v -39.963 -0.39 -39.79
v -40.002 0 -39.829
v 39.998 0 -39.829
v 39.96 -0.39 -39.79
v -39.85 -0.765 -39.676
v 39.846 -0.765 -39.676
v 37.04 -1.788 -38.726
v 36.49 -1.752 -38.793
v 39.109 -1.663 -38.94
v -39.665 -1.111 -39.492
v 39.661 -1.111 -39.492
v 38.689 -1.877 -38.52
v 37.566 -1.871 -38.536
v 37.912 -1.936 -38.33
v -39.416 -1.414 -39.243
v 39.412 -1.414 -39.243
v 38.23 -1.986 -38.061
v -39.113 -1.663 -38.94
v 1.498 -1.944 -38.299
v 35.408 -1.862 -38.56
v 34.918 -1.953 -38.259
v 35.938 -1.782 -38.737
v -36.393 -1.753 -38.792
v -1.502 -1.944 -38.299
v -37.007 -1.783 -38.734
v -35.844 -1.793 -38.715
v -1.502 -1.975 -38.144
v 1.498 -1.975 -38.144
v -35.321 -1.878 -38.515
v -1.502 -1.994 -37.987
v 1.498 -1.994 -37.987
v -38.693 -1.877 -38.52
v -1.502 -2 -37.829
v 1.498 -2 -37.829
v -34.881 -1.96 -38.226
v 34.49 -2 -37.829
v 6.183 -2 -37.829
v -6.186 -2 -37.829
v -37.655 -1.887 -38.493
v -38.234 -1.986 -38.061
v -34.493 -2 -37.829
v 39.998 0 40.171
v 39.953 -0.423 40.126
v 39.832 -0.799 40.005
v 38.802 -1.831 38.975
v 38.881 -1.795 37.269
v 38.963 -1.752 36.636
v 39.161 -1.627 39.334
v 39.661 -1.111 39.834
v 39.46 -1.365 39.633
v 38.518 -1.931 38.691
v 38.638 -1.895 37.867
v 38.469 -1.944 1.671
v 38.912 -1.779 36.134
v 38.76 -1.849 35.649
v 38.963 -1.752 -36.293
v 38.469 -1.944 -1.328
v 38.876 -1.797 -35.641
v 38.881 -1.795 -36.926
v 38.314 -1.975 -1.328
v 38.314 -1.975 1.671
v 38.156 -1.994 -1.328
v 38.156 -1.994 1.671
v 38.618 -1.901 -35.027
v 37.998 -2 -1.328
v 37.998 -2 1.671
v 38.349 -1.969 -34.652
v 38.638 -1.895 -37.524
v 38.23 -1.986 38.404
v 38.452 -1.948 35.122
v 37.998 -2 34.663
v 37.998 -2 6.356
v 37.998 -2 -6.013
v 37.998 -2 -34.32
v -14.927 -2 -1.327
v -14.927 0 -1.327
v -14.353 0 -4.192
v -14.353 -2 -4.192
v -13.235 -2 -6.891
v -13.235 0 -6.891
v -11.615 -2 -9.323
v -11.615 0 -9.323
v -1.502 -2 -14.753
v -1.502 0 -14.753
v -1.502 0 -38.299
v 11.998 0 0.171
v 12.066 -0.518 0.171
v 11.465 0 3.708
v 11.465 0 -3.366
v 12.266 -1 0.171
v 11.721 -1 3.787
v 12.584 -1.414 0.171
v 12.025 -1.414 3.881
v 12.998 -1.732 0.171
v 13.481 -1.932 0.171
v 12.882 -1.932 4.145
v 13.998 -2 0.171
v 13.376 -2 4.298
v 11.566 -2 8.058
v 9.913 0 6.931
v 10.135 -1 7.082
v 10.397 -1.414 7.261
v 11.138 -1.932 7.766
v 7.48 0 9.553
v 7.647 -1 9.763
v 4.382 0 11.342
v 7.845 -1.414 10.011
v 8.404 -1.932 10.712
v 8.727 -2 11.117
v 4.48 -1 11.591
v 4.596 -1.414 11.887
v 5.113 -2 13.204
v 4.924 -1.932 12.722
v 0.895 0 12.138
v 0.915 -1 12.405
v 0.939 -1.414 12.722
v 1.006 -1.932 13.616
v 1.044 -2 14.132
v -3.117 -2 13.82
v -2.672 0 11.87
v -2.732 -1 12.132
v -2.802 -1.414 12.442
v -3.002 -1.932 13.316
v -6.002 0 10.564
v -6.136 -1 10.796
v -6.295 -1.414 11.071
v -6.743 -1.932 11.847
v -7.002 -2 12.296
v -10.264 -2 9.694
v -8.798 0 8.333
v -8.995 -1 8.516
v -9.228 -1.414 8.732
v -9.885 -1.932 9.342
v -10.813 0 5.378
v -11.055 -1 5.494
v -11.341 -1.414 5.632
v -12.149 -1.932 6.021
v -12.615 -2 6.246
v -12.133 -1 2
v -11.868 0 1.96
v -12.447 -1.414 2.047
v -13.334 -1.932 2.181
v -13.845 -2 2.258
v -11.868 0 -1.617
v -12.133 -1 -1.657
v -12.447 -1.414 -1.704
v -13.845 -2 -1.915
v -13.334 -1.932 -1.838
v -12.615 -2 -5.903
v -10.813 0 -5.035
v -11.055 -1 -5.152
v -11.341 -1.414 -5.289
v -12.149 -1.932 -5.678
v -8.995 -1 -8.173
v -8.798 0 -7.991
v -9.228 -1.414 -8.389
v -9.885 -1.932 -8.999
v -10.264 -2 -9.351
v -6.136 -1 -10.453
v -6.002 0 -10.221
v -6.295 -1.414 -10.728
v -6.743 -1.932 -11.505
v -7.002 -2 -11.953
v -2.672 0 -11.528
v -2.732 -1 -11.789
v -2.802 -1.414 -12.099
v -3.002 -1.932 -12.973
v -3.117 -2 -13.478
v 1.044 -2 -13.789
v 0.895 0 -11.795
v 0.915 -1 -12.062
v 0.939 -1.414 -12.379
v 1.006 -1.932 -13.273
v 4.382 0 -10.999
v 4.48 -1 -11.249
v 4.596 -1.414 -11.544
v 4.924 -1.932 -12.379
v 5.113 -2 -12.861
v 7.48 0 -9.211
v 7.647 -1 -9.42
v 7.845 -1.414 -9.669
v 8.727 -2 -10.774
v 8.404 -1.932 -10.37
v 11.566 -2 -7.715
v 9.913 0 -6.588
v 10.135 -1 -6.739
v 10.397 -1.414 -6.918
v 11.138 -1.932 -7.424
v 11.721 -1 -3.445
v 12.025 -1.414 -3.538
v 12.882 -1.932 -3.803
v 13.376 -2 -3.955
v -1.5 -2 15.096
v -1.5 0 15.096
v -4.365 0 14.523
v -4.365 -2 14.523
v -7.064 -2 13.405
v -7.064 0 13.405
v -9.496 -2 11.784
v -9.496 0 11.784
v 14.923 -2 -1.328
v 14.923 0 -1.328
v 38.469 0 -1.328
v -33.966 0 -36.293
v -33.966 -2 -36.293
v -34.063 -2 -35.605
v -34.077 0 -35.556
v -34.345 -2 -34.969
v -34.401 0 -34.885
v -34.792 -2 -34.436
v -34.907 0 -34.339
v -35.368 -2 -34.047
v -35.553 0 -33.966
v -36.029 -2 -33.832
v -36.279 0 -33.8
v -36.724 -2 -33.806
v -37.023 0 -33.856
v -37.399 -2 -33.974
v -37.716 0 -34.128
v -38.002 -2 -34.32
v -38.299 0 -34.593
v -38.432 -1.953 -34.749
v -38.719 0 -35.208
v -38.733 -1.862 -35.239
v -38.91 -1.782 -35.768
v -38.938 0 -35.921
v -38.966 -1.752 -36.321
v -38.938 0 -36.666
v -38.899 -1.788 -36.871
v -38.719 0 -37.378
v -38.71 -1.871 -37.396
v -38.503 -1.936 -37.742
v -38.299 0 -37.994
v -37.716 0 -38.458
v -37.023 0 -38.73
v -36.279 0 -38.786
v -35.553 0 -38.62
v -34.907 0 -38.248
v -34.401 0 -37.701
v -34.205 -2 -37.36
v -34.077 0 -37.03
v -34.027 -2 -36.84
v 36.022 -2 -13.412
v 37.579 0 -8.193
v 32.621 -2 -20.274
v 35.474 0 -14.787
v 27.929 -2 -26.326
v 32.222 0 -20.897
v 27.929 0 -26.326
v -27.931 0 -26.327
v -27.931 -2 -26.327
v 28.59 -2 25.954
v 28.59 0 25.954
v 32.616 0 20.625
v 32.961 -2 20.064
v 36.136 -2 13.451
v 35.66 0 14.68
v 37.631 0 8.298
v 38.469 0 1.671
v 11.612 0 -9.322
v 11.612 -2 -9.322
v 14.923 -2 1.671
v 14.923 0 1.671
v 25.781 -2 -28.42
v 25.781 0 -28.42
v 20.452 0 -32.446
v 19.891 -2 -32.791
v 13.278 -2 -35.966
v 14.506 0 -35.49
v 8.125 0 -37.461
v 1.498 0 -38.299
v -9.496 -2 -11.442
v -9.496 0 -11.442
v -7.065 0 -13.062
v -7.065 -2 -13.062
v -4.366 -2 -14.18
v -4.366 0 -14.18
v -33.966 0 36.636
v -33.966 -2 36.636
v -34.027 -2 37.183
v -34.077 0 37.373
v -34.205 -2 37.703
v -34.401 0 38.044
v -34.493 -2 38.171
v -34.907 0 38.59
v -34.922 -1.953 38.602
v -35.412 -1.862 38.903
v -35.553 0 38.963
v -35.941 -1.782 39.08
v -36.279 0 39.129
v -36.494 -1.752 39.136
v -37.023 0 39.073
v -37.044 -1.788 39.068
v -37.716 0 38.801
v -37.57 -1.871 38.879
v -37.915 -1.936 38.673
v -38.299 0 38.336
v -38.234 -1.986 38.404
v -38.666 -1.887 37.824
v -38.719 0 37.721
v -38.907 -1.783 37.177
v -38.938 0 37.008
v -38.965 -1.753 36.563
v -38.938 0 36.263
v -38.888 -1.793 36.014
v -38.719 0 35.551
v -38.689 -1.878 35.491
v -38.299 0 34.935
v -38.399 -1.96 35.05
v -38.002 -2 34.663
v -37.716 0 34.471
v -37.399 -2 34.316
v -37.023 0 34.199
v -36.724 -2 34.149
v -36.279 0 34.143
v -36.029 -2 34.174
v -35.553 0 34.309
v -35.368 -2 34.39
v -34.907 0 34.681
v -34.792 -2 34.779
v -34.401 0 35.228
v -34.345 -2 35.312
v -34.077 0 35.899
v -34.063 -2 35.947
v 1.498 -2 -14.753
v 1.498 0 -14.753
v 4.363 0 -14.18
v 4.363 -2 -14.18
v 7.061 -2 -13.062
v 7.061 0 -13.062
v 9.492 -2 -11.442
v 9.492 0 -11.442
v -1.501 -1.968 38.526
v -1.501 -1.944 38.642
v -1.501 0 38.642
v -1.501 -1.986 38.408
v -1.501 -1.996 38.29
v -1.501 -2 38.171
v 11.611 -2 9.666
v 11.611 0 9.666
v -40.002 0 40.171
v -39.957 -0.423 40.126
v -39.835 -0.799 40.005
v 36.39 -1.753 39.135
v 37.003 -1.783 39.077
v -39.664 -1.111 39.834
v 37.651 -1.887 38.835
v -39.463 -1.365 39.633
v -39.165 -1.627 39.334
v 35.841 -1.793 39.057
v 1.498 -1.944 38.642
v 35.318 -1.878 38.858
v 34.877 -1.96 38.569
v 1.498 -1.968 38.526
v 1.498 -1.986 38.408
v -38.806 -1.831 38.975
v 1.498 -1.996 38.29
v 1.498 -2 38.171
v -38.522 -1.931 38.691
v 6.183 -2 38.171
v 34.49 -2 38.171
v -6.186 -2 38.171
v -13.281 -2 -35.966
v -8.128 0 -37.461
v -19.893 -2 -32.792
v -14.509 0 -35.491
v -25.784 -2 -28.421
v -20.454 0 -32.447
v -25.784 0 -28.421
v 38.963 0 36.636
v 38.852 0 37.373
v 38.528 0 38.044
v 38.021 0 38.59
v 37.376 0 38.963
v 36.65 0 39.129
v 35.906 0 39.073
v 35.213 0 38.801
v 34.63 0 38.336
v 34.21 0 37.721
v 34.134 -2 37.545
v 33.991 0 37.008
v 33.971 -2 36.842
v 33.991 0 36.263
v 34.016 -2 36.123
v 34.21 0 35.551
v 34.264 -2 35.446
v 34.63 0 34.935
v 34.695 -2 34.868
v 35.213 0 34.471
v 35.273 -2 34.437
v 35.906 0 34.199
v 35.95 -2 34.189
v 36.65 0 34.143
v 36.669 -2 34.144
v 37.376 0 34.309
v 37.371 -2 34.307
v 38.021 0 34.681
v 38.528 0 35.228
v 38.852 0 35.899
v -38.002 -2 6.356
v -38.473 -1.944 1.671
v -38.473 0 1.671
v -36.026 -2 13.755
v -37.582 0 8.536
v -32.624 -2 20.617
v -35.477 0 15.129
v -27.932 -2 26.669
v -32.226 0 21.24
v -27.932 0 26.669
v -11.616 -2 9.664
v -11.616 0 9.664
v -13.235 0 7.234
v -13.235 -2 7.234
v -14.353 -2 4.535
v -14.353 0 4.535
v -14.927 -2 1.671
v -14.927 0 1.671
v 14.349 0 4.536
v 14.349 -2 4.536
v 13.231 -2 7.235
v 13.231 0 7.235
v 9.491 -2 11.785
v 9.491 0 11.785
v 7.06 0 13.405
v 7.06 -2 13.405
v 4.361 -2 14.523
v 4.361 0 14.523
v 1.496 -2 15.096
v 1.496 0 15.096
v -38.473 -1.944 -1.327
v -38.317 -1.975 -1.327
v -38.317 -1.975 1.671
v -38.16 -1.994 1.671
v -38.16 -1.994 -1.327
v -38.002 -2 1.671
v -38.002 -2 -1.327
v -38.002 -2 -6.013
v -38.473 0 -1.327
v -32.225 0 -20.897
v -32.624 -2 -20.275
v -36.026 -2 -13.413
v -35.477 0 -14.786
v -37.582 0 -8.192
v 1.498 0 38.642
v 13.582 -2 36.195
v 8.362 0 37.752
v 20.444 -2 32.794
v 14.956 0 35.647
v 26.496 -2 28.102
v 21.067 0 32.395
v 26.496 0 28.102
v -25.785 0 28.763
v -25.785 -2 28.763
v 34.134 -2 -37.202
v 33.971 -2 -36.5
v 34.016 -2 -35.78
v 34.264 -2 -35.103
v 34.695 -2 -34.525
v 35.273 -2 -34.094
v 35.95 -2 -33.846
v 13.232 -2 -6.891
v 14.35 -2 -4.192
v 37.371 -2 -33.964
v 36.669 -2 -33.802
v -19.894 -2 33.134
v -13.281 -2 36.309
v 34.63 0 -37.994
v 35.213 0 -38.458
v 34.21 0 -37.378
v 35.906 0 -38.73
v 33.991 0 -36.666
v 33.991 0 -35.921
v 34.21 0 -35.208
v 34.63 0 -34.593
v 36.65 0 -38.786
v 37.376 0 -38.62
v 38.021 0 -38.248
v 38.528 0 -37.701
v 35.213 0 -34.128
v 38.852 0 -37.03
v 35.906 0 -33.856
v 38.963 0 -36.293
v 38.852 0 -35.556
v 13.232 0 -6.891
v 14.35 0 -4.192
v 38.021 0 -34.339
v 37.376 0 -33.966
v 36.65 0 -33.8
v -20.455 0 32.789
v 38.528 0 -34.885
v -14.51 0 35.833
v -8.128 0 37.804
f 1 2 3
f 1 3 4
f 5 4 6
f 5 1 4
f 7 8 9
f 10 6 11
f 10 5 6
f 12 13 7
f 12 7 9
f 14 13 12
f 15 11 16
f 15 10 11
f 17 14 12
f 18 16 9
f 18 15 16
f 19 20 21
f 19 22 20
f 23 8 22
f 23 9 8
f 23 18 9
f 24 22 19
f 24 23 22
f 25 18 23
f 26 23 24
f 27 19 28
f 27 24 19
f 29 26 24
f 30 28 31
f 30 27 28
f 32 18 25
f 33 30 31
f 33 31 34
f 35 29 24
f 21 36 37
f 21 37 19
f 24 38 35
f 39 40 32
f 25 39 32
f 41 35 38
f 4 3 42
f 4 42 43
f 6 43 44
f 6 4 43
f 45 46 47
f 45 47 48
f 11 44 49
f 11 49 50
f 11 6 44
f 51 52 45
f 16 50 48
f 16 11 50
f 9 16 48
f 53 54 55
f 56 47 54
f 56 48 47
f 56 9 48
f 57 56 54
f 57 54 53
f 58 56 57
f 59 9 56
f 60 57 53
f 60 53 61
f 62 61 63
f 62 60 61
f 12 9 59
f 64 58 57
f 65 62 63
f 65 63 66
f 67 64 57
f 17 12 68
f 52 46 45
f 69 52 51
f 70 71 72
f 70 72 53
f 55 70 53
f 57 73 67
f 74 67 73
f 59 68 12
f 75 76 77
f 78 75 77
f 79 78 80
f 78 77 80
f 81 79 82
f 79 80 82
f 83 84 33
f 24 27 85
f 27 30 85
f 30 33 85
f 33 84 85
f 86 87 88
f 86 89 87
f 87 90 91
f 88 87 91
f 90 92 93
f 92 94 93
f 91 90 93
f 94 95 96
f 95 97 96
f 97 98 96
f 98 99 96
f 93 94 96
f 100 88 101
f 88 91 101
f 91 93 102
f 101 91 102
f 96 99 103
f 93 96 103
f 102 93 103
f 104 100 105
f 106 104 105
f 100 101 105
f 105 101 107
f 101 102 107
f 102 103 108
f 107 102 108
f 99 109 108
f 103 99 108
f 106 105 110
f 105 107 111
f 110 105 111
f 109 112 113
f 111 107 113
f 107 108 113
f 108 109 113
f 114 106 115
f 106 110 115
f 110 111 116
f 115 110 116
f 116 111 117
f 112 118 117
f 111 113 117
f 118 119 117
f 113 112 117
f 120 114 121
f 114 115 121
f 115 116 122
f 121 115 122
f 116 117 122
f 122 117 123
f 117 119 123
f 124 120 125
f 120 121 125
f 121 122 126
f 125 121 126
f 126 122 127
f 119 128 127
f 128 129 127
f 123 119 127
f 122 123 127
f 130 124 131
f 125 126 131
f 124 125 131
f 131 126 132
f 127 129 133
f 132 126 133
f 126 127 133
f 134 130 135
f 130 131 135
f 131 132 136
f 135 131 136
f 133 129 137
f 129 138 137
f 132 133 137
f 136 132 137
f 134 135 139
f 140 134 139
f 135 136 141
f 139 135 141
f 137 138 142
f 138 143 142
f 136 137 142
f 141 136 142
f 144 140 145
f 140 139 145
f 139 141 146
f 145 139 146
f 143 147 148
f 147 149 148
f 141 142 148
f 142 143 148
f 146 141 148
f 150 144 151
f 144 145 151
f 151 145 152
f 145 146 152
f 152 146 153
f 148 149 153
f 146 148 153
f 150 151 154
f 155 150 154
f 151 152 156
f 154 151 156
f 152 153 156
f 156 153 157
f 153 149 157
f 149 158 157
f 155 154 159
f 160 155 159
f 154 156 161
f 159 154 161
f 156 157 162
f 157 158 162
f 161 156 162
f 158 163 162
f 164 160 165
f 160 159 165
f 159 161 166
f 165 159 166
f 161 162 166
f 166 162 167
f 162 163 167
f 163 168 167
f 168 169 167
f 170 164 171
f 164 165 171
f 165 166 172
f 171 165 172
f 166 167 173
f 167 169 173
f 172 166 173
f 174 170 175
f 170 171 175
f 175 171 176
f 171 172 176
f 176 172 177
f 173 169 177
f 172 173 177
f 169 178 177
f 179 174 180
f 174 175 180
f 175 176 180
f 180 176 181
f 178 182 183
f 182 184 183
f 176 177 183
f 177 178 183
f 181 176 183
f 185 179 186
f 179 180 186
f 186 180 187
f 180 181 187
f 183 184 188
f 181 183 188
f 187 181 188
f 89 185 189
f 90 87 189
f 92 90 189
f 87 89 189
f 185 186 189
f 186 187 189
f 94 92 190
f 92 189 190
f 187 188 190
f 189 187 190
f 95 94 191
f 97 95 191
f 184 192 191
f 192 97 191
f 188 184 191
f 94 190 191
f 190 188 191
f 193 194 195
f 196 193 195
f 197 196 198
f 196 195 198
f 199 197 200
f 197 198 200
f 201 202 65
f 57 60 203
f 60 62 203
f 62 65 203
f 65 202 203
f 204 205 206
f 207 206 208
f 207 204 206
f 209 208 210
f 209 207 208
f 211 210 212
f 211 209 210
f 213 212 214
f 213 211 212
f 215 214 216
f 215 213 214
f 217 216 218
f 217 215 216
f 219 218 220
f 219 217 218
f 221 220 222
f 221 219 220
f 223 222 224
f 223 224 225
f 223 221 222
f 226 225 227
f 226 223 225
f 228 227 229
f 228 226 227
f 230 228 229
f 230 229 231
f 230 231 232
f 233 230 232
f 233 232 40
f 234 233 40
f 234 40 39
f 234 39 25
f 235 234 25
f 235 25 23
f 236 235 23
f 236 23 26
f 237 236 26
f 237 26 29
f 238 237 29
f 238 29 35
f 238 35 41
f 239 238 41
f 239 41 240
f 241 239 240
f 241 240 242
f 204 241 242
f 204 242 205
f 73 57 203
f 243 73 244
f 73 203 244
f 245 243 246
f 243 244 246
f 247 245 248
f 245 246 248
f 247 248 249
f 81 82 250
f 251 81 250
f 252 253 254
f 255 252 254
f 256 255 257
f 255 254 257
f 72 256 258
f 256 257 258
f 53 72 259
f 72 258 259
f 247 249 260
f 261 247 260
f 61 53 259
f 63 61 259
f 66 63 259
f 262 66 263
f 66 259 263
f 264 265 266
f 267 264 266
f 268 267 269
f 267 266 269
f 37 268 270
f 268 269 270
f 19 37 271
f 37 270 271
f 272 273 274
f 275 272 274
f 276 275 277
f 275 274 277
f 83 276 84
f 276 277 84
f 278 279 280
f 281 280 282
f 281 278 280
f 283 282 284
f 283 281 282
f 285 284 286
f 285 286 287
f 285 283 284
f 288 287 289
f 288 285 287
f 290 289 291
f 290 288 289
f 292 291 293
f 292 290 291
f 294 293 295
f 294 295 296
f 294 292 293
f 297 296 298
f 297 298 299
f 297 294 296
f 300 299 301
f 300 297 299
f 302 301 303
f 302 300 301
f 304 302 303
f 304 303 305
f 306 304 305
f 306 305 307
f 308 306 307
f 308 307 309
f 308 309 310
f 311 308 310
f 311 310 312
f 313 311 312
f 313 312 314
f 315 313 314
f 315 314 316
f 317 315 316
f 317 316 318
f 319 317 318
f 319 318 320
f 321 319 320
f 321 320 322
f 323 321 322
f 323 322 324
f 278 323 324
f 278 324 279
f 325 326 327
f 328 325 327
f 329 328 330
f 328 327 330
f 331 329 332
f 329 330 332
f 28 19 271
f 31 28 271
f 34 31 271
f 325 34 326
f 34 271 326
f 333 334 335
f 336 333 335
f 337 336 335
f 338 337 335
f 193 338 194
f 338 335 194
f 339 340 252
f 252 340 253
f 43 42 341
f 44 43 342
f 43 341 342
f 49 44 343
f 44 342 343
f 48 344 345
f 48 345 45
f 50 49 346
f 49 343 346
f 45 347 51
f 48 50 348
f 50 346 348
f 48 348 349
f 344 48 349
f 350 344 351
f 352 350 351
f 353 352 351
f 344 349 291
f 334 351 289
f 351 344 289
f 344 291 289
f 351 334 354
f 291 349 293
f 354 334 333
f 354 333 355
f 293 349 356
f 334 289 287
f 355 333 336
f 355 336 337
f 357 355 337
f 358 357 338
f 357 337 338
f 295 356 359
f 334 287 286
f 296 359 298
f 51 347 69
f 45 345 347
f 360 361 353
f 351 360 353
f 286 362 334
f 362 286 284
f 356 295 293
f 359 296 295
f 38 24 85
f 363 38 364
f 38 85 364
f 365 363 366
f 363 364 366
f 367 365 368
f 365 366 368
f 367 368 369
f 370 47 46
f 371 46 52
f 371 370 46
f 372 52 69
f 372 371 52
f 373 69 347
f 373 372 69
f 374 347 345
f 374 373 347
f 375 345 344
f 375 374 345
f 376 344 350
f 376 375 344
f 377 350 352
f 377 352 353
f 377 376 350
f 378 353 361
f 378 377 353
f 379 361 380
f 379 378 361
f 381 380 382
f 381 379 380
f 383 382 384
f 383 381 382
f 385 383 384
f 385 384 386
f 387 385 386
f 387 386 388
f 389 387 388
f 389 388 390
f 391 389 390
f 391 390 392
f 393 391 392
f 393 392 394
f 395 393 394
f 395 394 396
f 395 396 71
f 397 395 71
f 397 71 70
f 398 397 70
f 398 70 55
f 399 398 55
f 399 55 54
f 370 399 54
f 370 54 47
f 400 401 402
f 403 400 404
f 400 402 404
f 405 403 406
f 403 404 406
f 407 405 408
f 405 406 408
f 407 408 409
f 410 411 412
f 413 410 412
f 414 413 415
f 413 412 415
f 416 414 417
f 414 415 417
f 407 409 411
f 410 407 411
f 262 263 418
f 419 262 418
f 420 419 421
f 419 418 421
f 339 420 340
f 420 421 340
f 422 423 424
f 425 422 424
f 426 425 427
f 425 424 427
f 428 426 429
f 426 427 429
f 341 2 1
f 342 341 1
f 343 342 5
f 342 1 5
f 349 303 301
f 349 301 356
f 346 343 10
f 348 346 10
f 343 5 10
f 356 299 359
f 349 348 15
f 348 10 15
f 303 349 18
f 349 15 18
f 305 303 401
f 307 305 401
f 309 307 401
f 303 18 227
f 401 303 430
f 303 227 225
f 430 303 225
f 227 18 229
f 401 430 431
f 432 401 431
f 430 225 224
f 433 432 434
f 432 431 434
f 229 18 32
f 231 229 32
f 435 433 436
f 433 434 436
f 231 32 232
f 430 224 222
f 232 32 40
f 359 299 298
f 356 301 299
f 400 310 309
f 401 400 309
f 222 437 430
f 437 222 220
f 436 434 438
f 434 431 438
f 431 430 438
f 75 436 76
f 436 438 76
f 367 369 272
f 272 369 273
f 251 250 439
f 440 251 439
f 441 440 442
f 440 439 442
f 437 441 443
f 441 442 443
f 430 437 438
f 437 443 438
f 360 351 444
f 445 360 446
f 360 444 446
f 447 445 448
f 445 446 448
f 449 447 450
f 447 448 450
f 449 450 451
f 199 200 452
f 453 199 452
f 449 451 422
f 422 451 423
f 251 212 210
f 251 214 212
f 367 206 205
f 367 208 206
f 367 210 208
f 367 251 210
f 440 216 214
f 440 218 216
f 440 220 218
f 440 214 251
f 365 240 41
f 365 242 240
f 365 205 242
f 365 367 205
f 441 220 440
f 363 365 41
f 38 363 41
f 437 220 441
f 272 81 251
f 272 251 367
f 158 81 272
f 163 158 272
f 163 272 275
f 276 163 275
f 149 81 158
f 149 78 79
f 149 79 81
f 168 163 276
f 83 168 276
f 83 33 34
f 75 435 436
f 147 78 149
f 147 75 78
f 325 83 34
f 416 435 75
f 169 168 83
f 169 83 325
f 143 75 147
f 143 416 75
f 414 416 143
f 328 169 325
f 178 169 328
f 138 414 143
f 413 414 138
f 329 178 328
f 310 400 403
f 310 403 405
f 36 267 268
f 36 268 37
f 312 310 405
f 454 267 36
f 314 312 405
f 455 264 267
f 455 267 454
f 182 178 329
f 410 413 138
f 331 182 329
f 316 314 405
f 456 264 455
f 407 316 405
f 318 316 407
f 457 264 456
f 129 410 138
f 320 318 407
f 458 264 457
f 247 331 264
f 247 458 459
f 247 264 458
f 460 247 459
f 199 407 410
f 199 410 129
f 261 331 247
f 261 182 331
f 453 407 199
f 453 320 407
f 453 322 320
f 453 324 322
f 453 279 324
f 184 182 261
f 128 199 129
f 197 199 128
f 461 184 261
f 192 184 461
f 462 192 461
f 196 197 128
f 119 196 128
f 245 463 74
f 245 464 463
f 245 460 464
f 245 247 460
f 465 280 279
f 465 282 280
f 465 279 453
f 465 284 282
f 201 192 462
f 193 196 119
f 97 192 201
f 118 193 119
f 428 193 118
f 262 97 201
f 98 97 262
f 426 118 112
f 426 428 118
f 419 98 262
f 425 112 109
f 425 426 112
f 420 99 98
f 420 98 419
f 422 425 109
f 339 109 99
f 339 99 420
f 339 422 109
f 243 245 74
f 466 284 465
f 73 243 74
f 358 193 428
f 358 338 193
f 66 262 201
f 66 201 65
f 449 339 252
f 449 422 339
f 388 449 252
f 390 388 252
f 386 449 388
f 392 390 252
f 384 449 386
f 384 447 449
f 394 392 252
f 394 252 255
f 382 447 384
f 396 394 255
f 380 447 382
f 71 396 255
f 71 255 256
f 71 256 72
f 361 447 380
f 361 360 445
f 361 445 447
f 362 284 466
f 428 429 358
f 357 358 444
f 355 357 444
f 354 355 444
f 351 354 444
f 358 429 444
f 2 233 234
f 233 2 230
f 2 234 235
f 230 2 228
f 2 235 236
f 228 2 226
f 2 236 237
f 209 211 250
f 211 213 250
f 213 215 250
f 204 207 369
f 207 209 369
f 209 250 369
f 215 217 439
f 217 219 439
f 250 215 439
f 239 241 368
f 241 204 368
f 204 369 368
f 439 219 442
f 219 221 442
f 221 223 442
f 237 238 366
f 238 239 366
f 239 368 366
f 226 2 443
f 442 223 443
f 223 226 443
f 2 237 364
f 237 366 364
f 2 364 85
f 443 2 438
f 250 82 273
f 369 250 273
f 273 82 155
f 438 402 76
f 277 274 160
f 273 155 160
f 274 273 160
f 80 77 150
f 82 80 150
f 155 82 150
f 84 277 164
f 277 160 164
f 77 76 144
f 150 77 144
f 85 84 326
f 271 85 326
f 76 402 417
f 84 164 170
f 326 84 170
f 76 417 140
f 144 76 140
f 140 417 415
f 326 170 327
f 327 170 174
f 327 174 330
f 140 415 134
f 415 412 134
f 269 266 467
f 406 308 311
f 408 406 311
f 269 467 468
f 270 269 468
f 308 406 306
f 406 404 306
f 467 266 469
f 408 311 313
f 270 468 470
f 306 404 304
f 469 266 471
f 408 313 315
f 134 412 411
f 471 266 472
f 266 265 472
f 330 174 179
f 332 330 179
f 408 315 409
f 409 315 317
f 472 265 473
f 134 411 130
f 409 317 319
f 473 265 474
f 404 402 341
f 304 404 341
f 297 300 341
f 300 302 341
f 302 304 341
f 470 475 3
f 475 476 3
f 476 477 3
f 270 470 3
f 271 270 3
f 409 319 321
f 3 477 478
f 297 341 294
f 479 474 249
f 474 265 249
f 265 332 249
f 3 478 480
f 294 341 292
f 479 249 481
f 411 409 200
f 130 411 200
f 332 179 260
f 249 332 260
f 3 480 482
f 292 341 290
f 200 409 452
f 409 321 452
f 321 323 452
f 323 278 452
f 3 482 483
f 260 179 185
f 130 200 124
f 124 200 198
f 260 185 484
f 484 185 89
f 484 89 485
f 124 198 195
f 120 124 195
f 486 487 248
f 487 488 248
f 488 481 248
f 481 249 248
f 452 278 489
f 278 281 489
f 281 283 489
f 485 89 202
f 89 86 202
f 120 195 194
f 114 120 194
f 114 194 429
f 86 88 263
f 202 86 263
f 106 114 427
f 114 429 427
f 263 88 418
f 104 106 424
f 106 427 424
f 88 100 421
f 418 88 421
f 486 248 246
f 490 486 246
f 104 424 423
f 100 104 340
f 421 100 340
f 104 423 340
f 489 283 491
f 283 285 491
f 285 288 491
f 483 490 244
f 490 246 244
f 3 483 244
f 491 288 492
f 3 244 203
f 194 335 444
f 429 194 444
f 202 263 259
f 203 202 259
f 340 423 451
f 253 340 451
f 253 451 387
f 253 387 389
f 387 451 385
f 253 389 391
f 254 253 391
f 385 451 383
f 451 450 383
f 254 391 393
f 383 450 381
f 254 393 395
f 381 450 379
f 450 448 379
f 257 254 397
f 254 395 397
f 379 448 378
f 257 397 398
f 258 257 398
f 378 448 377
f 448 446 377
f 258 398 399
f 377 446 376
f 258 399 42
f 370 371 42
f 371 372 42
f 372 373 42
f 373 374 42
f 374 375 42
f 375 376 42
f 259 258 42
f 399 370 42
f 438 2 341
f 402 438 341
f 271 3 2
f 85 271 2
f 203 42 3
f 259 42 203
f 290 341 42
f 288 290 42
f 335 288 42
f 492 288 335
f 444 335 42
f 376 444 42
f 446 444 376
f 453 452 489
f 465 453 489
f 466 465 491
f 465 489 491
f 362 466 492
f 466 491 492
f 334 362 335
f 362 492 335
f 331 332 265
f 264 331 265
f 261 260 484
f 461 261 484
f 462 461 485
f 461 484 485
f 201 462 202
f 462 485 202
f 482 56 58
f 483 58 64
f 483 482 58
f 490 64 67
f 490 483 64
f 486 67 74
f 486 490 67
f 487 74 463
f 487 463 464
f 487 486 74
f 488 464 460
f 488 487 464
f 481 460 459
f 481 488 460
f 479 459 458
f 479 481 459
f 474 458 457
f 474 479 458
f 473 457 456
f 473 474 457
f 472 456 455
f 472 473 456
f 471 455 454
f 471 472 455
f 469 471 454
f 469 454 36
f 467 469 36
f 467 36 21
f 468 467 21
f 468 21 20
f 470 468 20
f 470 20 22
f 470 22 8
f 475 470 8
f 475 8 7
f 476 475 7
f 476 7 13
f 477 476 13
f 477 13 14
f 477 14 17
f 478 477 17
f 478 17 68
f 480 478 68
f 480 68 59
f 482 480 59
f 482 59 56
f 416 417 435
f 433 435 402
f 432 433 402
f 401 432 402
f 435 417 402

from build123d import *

# Parameters (mm, degrees)
F0_W        = 80
F0_H        = 80
F0_R        = 2.5
F0_R_2      = 12
F1_DEPTH    = 2
F2_T1_DEPTH = 90
F2_T3_DEPTH = 90


# Not quite as in the source:
# - a fillet or chamfer that OpenCascade refuses, or shapes differently, is made with other operations: its cross-section is extruded or revolved along the edge and cut away or added


with BuildPart() as f1:
    # F0 (on Front) → F1 (new body)
    with BuildSketch(Plane.XZ):
        with Locations((-0.0017476827, 0.1713572443)):
            Rectangle(F0_W, F0_H)
        with Locations((-36.4662137768, -36.2931088498)):
            Circle(F0_R, mode=Mode.SUBTRACT)
        with Locations((36.4627184114, -36.2931088498)):
            Circle(F0_R, mode=Mode.SUBTRACT)
        with Locations((-36.4662137768, 36.6358233383)):
            Circle(F0_R, mode=Mode.SUBTRACT)
        with BuildLine():
            ThreePointArc((38.4690204407, 1.6713572443), (38.4909436544, 0.9214996478), (38.4982523173, 0.1713572443))
            ThreePointArc((38.4982523173, 0.1713572443), (38.4909464293, -0.5786427557), (38.4690315381, -1.3283581108))
            ThreePointArc((38.4690315381, -1.3283581108), (35.4737380316, -14.7865808935), (27.9287857338, -26.3264785744))
            ThreePointArc((27.9287857338, -26.3264785744), (26.8753996766, -27.3943633128), (25.7812151161, -28.4204043195))
            ThreePointArc((25.7812151161, -28.4204043195), (14.5064210867, -35.4904295724), (1.498122464, -38.2994159419))
            ThreePointArc((1.498122464, -38.2994159419), (0.7484071972, -38.3213338497), (-0.0015927734, -38.3286427554))
            ThreePointArc((-0.0015927734, -38.3286427554), (-0.7517476827, -38.3213368677), (-1.5016178294, -38.2994159419))
            ThreePointArc((-1.5016178294, -38.2994159419), (-14.5093699729, -35.4906518899), (-25.7838341949, -28.421194497))
            ThreePointArc((-25.7838341949, -28.421194497), (-26.8780502008, -27.3951870251), (-27.9314689858, -26.3273345712))
            ThreePointArc((-27.9314689858, -26.3273345712), (-35.4773135858, -14.7863907098), (-38.4725889134, -1.3267665824))
            ThreePointArc((-38.4725889134, -1.3267665824), (-38.4944573001, -0.5778465387), (-38.5017476827, 0.1713572443))
            ThreePointArc((-38.5017476827, 0.1713572443), (-38.4944390198, 0.9214996478), (-38.472515806, 1.6713572443))
            ThreePointArc((-38.472515806, 1.6713572443), (-35.4771780599, 15.1294266234), (-27.9322810992, 26.6691930629))
            ThreePointArc((-27.9322810992, 26.6691930629), (-26.878895042, 27.7370778013), (-25.7847104814, 28.763118808))
            ThreePointArc((-25.7847104814, 28.763118808), (-14.5098447074, 35.8331732485), (-1.5014630377, 38.642136465))
            ThreePointArc((-1.5014630377, 38.642136465), (-0.7517476827, 38.6640513563), (-0.0017476827, 38.6713572443))
            ThreePointArc((-0.0017476827, 38.6713572443), (0.7482523173, 38.6640513563), (1.4979676723, 38.642136465))
            ThreePointArc((1.4979676723, 38.642136465), (14.9561904551, 35.6468429586), (26.4960881359, 28.1018906607))
            ThreePointArc((26.4960881359, 28.1018906607), (27.5639728743, 27.0485046035), (28.5900138811, 25.954320043))
            ThreePointArc((28.5900138811, 25.954320043), (35.6600146487, 14.6795861996), (38.4690204407, 1.6713572443))
        make_face(mode=Mode.SUBTRACT)
        with Locations((36.4627184114, 36.6358233383)):
            Circle(F0_R, mode=Mode.SUBTRACT)
        with BuildLine():
            Line((-9.495982875, 11.7842594703), (-25.7847104814, 28.763118808))
            ThreePointArc((-25.7847104814, 28.763118808), (-26.878895042, 27.7370778013), (-27.9322810992, 26.6691930629))
            Line((-27.9322810992, 26.6691930629), (-11.6157607218, 9.6642335801))
            ThreePointArc((-11.6157607218, 9.6642335801), (-10.608969906, 10.7773384203), (-9.495982875, 11.7842594703))
        make_face()
        with BuildLine():
            ThreePointArc((14.9230924791, -1.3283581108), (14.9794505742, -0.5794415216), (14.9982523173, 0.1713572443))
            ThreePointArc((14.9982523173, 0.1713572443), (14.979443414, 0.9222988702), (14.9230638739, 1.6713572443))
            ThreePointArc((14.9230638739, 1.6713572443), (13.8560844811, 5.9124797581), (11.6111545434, 9.6655924366))
            ThreePointArc((11.6111545434, 9.6655924366), (10.6042334933, 10.7785794675), (9.4911286531, 11.7853702834))
            ThreePointArc((9.4911286531, 11.7853702834), (5.7376930398, 14.0298860332), (1.496376144, 15.0963572443))
            ThreePointArc((1.496376144, 15.0963572443), (0.7482523173, 15.1525955108), (-0.0017476827, 15.1713572443))
            ThreePointArc((-0.0017476827, 15.1713572443), (-0.7517476827, 15.1525955108), (-1.4998715093, 15.0963572443))
            ThreePointArc((-1.4998715093, 15.0963572443), (-5.7419991682, 14.0295502319), (-9.495982875, 11.7842594703))
            ThreePointArc((-9.495982875, 11.7842594703), (-10.608969906, 10.7773384203), (-11.6157607218, 9.6642335801))
            ThreePointArc((-11.6157607218, 9.6642335801), (-13.8599156987, 5.9116690162), (-14.9265592393, 1.6713572443))
            ThreePointArc((-14.9265592393, 1.6713572443), (-14.9829387793, 0.9222988702), (-15.0017476827, 0.1713572443))
            ThreePointArc((-15.0017476827, 0.1713572443), (-14.9829859493, -0.5786427557), (-14.9267476827, -1.3267665824))
            ThreePointArc((-14.9267476827, -1.3267665824), (-13.8599406704, -5.5688942412), (-11.6146499088, -9.3228779481))
            ThreePointArc((-11.6146499088, -9.3228779481), (-10.6083494005, -10.4352444735), (-9.495982875, -11.4415449818))
            ThreePointArc((-9.495982875, -11.4415449818), (-5.7428099115, -13.6864998947), (-1.5016178294, -14.7534673625))
            ThreePointArc((-1.5016178294, -14.7534673625), (-0.7525467792, -14.8098409961), (-0.0015927734, -14.8286427549))
            ThreePointArc((-0.0015927734, -14.8286427549), (0.7492061289, -14.8098332416), (1.498122464, -14.7534673625))
            ThreePointArc((1.498122464, -14.7534673625), (5.7393145462, -13.6864998947), (9.4924875096, -11.4415449818))
            ThreePointArc((9.4924875096, -11.4415449818), (10.6054745406, -10.4346239318), (11.6122653564, -9.3215190916))
            ThreePointArc((11.6122653564, -9.3215190916), (13.8564750721, -5.5688223766), (14.9230924791, -1.3283581108))
        make_face()
        with Locations((-0.0017476827, 0.1713572443)):
            Circle(F0_R_2, mode=Mode.SUBTRACT)
        with BuildLine():
            Line((-0.0017476827, 15.1713572443), (-0.0017476827, 38.6713572443))
            ThreePointArc((-0.0017476827, 38.6713572443), (-0.7517476827, 38.6640513563), (-1.5014630377, 38.642136465))
            Line((-1.5014630377, 38.642136465), (-1.4998715093, 15.0963572443))
            ThreePointArc((-1.4998715093, 15.0963572443), (-0.7517476827, 15.1525955108), (-0.0017476827, 15.1713572443))
        make_face()
        with BuildLine():
            Line((1.496376144, 15.0963572443), (1.4979676723, 38.642136465))
            ThreePointArc((1.4979676723, 38.642136465), (0.7482523173, 38.6640513563), (-0.0017476827, 38.6713572443))
            Line((-0.0017476827, 38.6713572443), (-0.0017476827, 15.1713572443))
            ThreePointArc((-0.0017476827, 15.1713572443), (0.7482523173, 15.1525955108), (1.496376144, 15.0963572443))
        make_face()
        with BuildLine():
            Line((11.6111545434, 9.6655924366), (28.5900138811, 25.954320043))
            ThreePointArc((28.5900138811, 25.954320043), (27.5639728743, 27.0485046035), (26.4960881359, 28.1018906607))
            Line((26.4960881359, 28.1018906607), (9.4911286531, 11.7853702834))
            ThreePointArc((9.4911286531, 11.7853702834), (10.6042334933, 10.7785794675), (11.6111545434, 9.6655924366))
        make_face()
        with BuildLine():
            Line((14.9982523173, 0.1713572443), (38.4982523173, 0.1713572443))
            ThreePointArc((38.4982523173, 0.1713572443), (38.4909436544, 0.9214996478), (38.4690204407, 1.6713572443))
            Line((38.4690204407, 1.6713572443), (14.9230638739, 1.6713572443))
            ThreePointArc((14.9230638739, 1.6713572443), (14.979443414, 0.9222988702), (14.9982523173, 0.1713572443))
        make_face()
        with BuildLine():
            ThreePointArc((38.4690315381, -1.3283581108), (38.4909464293, -0.5786427557), (38.4982523173, 0.1713572443))
            Line((38.4982523173, 0.1713572443), (14.9982523173, 0.1713572443))
            ThreePointArc((14.9982523173, 0.1713572443), (14.9794505742, -0.5794415216), (14.9230924791, -1.3283581108))
            Line((14.9230924791, -1.3283581108), (38.4690315381, -1.3283581108))
        make_face()
        with BuildLine():
            ThreePointArc((25.7812151161, -28.4204043195), (26.8753996766, -27.3943633128), (27.9287857338, -26.3264785744))
            Line((27.9287857338, -26.3264785744), (11.6122653564, -9.3215190916))
            ThreePointArc((11.6122653564, -9.3215190916), (10.6054745406, -10.4346239318), (9.4924875096, -11.4415449818))
            Line((9.4924875096, -11.4415449818), (25.7812151161, -28.4204043195))
        make_face()
        with BuildLine():
            ThreePointArc((-0.0015927734, -38.3286427554), (0.7484071972, -38.3213338497), (1.498122464, -38.2994159419))
            Line((1.498122464, -38.2994159419), (1.498122464, -14.7534673625))
            ThreePointArc((1.498122464, -14.7534673625), (0.7492061289, -14.8098332416), (-0.0015927734, -14.8286427549))
            Line((-0.0015927734, -14.8286427549), (-0.0015927734, -38.3286427554))
        make_face()
        with BuildLine():
            ThreePointArc((-1.5016178294, -38.2994159419), (-0.7517476827, -38.3213368677), (-0.0015927734, -38.3286427554))
            Line((-0.0015927734, -38.3286427554), (-0.0015927734, -14.8286427549))
            ThreePointArc((-0.0015927734, -14.8286427549), (-0.7525467792, -14.8098409961), (-1.5016178294, -14.7534673625))
            Line((-1.5016178294, -14.7534673625), (-1.5016178294, -38.2994159419))
        make_face()
        with BuildLine():
            ThreePointArc((-27.9314689858, -26.3273345712), (-26.8780502008, -27.3951870251), (-25.7838341949, -28.421194497))
            Line((-25.7838341949, -28.421194497), (-9.495982875, -11.4415449818))
            ThreePointArc((-9.495982875, -11.4415449818), (-10.6083494005, -10.4352444735), (-11.6146499088, -9.3228779481))
            Line((-11.6146499088, -9.3228779481), (-27.9314689858, -26.3273345712))
        make_face()
        with BuildLine():
            ThreePointArc((-38.5017476827, 0.1713572443), (-38.4944573001, -0.5778465387), (-38.4725889134, -1.3267665824))
            Line((-38.4725889134, -1.3267665824), (-14.9267476827, -1.3267665824))
            ThreePointArc((-14.9267476827, -1.3267665824), (-14.9829859493, -0.5786427557), (-15.0017476827, 0.1713572443))
            Line((-15.0017476827, 0.1713572443), (-38.5017476827, 0.1713572443))
        make_face()
        with BuildLine():
            Line((-14.9265592393, 1.6713572443), (-38.472515806, 1.6713572443))
            ThreePointArc((-38.472515806, 1.6713572443), (-38.4944390198, 0.9214996478), (-38.5017476827, 0.1713572443))
            Line((-38.5017476827, 0.1713572443), (-15.0017476827, 0.1713572443))
            ThreePointArc((-15.0017476827, 0.1713572443), (-14.9829387793, 0.9222988702), (-14.9265592393, 1.6713572443))
        make_face()
    extrude(amount=F1_DEPTH)

    # F2: fillet of radius 2 on 5 edges, made by hand

    # F2_s2 → F2_t1 (cut)
    with BuildSketch(Plane.YZ.offset(-45.0017476827)):
        with BuildLine():
            ThreePointArc((0, 40.1713572443), (-1.4142135624, 39.5855708066), (-2, 38.1713572443))
            Line((-2, 38.1713572443), (-2, 40.1713572443))
            Line((-2, 40.1713572443), (0, 40.1713572443))
        make_face()
        with BuildLine():
            ThreePointArc((0, -39.8286427557), (-1.4142135624, -39.2428563181), (-2, -37.8286427557))
            Line((-2, -37.8286427557), (-2, -39.8286427557))
            Line((-2, -39.8286427557), (0, -39.8286427557))
        make_face()
    extrude(amount=F2_T1_DEPTH, mode=Mode.SUBTRACT)

    # F2_s4 → F2_t3 (cut)
    with BuildSketch(Plane.XY.offset(-44.8286427557)):
        with BuildLine():
            ThreePointArc((39.9982523173, 0), (39.4124658797, -1.4142135624), (37.9982523173, -2))
            Line((37.9982523173, -2), (39.9982523173, -2))
            Line((39.9982523173, -2), (39.9982523173, 0))
        make_face()
        with BuildLine():
            ThreePointArc((-40.0017476827, 0), (-39.4159612451, -1.4142135624), (-38.0017476827, -2))
            Line((-38.0017476827, -2), (-40.0017476827, -2))
            Line((-40.0017476827, -2), (-40.0017476827, 0))
        make_face()
    extrude(amount=F2_T3_DEPTH, mode=Mode.SUBTRACT)

    # F2_s5 → F2_t6 (revolve, cut)
    with BuildSketch(Plane.XY.offset(0.1713572443)):
        with BuildLine():
            ThreePointArc((11.9982523173, 0), (12.5840387549, -1.4142135624), (13.9982523173, -2))
            Line((13.9982523173, -2), (11.9982523173, -2))
            Line((11.9982523173, -2), (11.9982523173, 0))
        make_face()
    revolve(axis=Axis((-0.0017476827, -2, 0.1713572443), (0, -1, 0)), mode=Mode.SUBTRACT)


solid = f1.part
